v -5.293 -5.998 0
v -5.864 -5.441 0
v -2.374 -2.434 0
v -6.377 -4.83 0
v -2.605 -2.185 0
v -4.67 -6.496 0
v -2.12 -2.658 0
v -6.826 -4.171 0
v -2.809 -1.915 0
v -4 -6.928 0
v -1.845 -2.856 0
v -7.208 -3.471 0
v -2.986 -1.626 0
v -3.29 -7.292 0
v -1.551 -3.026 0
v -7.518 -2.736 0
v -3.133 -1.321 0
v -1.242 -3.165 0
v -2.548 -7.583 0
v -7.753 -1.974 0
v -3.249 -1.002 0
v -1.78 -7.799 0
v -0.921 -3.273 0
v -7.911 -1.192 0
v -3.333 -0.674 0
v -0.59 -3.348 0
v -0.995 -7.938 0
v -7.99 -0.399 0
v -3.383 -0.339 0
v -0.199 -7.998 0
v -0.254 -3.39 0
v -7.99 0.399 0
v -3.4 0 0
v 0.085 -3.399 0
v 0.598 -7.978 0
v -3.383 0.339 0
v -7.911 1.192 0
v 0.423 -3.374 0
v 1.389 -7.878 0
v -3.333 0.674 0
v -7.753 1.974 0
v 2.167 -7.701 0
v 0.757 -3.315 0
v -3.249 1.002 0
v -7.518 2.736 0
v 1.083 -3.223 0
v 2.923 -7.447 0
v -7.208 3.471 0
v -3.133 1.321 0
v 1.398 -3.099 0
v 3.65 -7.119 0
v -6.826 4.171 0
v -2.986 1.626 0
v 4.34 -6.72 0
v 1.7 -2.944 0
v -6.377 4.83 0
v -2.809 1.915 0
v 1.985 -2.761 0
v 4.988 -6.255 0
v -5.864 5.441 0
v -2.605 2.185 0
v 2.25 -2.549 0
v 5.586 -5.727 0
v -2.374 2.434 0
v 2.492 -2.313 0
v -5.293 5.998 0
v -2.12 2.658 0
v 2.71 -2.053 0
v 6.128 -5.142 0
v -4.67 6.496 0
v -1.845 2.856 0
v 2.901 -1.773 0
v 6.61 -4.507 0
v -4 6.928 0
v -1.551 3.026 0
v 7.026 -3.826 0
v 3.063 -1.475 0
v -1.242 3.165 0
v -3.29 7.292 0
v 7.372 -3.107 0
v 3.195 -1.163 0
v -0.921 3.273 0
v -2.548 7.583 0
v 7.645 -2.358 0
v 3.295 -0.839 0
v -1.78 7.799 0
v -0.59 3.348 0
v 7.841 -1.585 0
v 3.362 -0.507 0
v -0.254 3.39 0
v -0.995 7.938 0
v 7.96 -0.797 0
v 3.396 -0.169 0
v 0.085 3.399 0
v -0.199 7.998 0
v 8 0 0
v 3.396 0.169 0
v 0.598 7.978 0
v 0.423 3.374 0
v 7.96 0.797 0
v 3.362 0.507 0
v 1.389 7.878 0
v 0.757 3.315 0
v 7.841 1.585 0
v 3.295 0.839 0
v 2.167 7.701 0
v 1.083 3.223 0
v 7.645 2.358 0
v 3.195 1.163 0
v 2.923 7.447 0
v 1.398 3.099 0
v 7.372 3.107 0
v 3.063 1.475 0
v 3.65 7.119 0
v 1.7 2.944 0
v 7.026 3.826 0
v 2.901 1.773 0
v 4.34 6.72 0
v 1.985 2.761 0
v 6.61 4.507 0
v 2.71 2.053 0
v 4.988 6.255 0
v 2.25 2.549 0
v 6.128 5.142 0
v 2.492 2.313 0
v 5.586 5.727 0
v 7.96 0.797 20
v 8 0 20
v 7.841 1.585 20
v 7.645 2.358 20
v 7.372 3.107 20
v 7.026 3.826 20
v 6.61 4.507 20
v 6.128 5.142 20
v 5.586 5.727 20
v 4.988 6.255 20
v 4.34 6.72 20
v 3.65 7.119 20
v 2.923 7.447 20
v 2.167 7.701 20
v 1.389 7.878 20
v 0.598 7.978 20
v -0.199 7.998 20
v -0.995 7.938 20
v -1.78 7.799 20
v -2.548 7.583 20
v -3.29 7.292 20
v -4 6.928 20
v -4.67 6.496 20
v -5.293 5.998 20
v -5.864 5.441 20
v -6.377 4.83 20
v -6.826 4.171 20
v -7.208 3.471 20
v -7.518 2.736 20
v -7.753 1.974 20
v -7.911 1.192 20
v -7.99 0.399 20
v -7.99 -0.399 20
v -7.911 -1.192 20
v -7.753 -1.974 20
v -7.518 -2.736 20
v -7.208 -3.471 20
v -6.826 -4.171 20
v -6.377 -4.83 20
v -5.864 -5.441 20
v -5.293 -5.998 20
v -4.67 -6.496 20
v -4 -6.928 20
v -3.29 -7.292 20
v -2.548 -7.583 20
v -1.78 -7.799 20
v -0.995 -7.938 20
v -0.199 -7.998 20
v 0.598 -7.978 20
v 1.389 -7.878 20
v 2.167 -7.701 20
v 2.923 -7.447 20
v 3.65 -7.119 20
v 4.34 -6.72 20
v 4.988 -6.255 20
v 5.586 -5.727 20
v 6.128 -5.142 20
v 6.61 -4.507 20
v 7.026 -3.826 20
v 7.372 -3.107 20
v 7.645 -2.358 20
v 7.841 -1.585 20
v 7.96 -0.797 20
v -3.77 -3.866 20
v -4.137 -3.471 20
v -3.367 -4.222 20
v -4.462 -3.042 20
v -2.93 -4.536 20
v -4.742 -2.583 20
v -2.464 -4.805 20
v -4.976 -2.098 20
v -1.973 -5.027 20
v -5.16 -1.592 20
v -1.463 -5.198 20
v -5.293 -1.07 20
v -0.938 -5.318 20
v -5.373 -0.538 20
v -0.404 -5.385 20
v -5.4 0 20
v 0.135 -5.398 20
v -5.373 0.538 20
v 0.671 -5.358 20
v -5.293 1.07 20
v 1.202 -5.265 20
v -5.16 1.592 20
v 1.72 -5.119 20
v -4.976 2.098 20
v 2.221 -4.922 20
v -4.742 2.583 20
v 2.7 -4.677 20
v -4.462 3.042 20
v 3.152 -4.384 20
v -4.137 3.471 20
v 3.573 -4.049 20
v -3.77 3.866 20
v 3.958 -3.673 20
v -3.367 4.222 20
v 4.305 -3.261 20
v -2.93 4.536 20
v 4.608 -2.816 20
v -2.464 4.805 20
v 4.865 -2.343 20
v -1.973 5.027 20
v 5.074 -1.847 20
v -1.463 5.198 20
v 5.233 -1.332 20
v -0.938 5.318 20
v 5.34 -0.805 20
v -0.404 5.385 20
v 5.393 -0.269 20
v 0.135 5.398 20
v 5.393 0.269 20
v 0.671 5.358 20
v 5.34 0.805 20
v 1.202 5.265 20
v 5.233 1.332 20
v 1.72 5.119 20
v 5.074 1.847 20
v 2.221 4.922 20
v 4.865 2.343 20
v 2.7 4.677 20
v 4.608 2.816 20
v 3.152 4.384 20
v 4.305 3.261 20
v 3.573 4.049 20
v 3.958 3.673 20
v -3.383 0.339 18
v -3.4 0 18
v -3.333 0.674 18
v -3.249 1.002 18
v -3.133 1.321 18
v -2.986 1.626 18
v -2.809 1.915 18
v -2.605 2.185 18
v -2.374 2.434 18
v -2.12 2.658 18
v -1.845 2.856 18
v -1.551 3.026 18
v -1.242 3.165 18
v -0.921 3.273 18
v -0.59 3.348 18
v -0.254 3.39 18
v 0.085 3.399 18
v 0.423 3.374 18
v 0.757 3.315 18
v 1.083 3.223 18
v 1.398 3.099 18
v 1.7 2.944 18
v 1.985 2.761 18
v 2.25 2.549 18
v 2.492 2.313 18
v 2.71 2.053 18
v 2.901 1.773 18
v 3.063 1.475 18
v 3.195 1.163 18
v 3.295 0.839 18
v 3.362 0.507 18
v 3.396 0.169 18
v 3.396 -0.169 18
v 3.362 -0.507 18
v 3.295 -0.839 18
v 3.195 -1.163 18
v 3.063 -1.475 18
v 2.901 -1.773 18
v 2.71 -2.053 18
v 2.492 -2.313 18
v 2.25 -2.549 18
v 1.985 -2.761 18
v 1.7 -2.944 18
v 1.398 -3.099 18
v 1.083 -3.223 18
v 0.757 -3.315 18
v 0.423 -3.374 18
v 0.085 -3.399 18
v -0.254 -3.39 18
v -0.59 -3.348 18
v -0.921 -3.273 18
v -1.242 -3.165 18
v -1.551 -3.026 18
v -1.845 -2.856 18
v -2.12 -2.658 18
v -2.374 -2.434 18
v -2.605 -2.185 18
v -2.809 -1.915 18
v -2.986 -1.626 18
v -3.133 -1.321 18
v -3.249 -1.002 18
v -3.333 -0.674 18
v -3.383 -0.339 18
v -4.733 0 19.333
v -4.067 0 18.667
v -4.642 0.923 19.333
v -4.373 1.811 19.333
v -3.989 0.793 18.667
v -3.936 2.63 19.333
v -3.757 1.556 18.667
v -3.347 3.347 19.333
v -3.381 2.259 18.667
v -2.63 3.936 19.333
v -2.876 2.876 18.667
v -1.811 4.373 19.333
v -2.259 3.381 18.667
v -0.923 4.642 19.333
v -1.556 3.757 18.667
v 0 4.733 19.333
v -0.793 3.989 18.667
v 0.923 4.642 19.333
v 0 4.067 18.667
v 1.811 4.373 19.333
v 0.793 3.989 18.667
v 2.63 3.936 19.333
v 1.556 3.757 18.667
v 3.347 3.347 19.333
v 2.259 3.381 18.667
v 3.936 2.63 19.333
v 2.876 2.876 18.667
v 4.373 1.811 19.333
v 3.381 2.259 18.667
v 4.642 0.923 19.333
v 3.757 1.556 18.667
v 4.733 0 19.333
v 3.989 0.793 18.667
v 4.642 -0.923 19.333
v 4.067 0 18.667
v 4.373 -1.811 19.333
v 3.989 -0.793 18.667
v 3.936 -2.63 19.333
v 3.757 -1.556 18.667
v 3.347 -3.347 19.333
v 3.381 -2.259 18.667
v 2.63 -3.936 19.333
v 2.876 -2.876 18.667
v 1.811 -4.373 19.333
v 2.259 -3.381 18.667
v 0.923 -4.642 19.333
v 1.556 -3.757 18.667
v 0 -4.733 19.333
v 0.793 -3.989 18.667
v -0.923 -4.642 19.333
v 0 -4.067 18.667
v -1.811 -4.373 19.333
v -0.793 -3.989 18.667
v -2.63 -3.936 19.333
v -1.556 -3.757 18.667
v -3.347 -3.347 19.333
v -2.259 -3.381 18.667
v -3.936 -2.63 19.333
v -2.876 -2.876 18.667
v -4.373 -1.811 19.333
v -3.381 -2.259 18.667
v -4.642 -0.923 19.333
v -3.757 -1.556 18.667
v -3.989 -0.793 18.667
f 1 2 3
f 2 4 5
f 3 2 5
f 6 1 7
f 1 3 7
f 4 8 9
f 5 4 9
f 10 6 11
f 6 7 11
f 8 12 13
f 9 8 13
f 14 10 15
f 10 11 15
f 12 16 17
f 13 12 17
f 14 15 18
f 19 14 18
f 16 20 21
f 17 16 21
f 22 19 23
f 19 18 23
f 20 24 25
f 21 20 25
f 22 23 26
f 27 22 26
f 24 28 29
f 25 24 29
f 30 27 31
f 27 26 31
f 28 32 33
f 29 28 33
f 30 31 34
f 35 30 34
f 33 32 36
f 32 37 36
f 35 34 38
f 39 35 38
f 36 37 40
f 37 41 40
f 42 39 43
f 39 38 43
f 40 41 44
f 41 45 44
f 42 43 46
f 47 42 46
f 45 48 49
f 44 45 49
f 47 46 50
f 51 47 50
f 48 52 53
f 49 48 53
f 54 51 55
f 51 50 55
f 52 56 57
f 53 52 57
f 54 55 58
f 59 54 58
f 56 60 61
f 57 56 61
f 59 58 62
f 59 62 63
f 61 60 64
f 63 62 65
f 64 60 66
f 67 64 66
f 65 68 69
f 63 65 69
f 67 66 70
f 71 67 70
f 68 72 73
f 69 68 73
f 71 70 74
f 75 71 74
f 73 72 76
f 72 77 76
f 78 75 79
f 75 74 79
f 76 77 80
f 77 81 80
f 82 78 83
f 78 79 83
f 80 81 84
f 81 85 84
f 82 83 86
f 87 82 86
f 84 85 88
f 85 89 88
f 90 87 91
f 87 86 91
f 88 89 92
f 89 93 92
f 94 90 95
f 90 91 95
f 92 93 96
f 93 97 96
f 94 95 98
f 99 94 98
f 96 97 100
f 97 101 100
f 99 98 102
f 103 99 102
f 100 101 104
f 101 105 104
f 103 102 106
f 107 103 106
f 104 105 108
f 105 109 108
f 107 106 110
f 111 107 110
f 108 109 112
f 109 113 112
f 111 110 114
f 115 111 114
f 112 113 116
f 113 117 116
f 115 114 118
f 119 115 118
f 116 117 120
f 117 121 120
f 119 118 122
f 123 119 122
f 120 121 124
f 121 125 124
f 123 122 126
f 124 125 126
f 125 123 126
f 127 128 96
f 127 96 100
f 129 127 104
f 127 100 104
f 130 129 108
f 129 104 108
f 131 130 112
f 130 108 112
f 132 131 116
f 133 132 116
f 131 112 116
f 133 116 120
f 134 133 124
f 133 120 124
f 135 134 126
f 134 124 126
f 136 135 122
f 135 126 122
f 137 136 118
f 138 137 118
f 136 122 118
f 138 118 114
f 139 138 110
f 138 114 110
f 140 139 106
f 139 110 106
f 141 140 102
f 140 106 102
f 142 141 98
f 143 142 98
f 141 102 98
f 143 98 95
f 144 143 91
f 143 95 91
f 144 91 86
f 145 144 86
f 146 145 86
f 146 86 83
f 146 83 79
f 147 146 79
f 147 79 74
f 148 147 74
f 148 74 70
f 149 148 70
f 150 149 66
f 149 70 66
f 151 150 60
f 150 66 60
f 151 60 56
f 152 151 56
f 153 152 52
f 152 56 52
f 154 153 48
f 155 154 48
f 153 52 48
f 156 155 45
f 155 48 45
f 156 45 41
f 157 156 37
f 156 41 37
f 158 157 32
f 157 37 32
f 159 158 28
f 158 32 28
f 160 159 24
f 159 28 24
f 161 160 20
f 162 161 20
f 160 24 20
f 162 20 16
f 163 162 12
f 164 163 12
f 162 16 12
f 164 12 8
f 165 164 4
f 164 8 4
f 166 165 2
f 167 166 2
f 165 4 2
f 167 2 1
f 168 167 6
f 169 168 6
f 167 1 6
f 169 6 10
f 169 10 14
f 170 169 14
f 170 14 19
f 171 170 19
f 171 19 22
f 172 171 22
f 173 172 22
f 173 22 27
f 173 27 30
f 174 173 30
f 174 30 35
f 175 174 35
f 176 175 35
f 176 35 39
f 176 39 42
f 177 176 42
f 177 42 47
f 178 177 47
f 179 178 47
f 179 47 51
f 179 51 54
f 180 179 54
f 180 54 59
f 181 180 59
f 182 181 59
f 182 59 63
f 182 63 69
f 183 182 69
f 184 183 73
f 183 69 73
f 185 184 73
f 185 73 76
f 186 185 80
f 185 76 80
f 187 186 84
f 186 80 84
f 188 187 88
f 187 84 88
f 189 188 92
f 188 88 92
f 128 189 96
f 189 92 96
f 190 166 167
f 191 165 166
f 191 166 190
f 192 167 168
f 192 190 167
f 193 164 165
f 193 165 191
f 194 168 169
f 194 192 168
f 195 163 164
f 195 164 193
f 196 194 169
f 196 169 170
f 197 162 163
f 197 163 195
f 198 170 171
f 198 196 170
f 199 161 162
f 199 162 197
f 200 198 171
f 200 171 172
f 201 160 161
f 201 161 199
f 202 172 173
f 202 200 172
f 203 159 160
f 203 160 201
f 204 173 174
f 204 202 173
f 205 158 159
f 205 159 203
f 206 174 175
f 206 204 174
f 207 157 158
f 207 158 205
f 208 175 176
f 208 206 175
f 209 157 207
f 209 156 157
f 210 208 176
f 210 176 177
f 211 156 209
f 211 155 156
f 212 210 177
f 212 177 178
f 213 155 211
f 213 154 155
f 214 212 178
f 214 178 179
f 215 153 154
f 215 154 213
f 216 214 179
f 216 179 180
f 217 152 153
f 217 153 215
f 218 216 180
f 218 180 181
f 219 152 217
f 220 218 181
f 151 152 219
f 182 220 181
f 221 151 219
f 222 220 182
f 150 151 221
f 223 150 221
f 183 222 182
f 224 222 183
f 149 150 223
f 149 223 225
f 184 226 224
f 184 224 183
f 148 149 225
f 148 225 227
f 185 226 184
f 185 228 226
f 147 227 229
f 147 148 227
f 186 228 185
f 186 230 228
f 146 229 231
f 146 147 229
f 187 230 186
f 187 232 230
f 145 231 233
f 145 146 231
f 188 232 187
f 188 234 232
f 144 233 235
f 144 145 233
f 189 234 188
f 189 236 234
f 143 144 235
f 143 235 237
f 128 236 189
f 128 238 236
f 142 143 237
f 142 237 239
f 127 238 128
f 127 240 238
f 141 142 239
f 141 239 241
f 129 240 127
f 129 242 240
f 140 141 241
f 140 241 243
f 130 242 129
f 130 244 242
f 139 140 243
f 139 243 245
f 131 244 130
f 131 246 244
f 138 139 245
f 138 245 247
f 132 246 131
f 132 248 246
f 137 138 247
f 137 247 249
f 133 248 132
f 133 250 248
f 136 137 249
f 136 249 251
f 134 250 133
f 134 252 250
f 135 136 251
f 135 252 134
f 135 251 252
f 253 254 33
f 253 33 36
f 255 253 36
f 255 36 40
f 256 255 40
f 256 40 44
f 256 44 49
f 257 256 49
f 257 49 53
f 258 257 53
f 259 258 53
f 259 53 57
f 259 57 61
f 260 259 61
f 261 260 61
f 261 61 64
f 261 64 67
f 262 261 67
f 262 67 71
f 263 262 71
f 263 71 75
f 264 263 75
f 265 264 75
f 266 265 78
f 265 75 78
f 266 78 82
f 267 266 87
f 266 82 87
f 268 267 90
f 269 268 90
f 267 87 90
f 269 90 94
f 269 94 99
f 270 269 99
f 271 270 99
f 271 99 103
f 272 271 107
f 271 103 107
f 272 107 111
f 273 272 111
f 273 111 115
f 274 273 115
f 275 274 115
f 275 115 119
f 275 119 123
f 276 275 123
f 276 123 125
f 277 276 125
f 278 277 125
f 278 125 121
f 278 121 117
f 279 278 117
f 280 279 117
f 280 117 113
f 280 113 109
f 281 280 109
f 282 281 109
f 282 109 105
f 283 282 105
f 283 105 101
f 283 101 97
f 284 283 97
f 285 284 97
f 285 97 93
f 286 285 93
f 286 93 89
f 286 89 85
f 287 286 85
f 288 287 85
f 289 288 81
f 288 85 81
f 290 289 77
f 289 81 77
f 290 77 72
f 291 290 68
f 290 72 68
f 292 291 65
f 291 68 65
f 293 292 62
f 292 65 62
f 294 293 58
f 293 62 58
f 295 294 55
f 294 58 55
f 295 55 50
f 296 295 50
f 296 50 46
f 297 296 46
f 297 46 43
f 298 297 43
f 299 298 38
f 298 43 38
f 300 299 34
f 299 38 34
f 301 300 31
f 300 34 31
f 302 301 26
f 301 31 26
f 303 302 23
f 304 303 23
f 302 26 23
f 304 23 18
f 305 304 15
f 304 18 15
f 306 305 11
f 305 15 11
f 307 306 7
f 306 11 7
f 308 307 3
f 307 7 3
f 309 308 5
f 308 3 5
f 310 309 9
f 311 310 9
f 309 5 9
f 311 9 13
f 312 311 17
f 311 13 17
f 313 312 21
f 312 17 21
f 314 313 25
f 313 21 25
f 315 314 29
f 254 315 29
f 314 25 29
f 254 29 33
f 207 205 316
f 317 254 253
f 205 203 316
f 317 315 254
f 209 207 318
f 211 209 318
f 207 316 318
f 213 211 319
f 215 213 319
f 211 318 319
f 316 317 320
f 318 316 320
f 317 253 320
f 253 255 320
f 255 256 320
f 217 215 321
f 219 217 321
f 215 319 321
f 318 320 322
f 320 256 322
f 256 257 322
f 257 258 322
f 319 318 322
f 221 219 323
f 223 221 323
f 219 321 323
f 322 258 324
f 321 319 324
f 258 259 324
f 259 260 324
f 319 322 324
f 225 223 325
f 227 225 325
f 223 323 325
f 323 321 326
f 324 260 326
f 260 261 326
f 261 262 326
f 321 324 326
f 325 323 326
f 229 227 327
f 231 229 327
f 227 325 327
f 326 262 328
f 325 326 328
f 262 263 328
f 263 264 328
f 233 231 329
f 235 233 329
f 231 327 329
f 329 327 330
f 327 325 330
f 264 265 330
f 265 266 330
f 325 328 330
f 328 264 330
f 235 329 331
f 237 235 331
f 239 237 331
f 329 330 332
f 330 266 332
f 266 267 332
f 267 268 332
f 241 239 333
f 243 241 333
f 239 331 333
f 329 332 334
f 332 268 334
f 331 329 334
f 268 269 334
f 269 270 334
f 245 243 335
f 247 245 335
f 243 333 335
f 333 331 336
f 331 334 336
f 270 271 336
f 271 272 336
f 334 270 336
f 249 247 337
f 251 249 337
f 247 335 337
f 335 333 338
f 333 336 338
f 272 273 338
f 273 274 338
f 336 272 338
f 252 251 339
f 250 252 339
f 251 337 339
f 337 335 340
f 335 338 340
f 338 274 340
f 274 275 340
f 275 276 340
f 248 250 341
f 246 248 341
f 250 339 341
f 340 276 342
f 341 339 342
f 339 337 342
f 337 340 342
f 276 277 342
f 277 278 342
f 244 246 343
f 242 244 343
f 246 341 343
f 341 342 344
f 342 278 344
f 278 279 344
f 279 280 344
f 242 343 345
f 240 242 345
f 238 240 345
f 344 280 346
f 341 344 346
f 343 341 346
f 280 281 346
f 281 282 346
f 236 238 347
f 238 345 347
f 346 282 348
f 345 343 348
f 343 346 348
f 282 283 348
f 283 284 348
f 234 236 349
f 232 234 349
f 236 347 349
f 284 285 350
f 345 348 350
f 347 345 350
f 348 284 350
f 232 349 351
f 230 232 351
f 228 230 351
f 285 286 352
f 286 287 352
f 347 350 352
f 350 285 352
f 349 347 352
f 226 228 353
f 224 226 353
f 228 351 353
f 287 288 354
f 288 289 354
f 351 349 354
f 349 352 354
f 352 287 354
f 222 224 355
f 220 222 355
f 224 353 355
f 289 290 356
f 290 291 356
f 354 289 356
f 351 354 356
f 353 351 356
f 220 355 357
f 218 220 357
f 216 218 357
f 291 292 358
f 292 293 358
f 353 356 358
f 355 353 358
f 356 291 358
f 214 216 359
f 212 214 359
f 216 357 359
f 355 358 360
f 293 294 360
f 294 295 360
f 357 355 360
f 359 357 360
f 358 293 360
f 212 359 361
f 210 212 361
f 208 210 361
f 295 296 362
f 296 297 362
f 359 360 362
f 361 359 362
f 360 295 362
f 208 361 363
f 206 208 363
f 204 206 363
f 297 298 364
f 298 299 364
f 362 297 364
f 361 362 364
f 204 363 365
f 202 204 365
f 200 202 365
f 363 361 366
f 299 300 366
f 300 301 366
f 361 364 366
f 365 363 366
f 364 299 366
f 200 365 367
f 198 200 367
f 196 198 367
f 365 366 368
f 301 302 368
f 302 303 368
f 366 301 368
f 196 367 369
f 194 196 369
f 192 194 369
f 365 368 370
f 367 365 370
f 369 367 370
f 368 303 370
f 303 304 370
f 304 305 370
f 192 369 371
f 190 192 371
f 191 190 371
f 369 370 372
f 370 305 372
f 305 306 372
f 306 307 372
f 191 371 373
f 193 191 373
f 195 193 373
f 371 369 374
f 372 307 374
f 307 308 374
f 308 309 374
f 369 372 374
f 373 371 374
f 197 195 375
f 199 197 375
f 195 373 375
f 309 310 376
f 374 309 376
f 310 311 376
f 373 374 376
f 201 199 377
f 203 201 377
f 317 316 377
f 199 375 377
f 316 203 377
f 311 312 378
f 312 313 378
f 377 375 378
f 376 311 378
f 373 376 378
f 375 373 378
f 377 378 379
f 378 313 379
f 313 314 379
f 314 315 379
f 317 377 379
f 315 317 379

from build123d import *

# Parameters (mm, degrees)
SKETCH_1_R        = 8
EXTRUDE_1_DEPTH   = 20
HOLE_WIZARD_M81_D = 6.8
CHAMFER_1_SIZE    = 2


with BuildPart() as part:
    # Эскиз1 → Бобышка-Вытянуть1 (new body)
    with BuildSketch(Plane.XY):
        Circle(SKETCH_1_R)
    extrude(amount=EXTRUDE_1_DEPTH)

    # Отверстие обработанное метчиком M81 (through all)
    with Locations(Plane.XY.offset(20)):
        with Locations((0, 0)):
            Hole(HOLE_WIZARD_M81_D / 2)

    # Фаска1
    chamfer_1_edges = [part.edges().sort_by_distance(p)[0] for p in [
        (3.4, 0, 20),
    ]]
    chamfer(chamfer_1_edges, length=CHAMFER_1_SIZE)


solid = part.part
